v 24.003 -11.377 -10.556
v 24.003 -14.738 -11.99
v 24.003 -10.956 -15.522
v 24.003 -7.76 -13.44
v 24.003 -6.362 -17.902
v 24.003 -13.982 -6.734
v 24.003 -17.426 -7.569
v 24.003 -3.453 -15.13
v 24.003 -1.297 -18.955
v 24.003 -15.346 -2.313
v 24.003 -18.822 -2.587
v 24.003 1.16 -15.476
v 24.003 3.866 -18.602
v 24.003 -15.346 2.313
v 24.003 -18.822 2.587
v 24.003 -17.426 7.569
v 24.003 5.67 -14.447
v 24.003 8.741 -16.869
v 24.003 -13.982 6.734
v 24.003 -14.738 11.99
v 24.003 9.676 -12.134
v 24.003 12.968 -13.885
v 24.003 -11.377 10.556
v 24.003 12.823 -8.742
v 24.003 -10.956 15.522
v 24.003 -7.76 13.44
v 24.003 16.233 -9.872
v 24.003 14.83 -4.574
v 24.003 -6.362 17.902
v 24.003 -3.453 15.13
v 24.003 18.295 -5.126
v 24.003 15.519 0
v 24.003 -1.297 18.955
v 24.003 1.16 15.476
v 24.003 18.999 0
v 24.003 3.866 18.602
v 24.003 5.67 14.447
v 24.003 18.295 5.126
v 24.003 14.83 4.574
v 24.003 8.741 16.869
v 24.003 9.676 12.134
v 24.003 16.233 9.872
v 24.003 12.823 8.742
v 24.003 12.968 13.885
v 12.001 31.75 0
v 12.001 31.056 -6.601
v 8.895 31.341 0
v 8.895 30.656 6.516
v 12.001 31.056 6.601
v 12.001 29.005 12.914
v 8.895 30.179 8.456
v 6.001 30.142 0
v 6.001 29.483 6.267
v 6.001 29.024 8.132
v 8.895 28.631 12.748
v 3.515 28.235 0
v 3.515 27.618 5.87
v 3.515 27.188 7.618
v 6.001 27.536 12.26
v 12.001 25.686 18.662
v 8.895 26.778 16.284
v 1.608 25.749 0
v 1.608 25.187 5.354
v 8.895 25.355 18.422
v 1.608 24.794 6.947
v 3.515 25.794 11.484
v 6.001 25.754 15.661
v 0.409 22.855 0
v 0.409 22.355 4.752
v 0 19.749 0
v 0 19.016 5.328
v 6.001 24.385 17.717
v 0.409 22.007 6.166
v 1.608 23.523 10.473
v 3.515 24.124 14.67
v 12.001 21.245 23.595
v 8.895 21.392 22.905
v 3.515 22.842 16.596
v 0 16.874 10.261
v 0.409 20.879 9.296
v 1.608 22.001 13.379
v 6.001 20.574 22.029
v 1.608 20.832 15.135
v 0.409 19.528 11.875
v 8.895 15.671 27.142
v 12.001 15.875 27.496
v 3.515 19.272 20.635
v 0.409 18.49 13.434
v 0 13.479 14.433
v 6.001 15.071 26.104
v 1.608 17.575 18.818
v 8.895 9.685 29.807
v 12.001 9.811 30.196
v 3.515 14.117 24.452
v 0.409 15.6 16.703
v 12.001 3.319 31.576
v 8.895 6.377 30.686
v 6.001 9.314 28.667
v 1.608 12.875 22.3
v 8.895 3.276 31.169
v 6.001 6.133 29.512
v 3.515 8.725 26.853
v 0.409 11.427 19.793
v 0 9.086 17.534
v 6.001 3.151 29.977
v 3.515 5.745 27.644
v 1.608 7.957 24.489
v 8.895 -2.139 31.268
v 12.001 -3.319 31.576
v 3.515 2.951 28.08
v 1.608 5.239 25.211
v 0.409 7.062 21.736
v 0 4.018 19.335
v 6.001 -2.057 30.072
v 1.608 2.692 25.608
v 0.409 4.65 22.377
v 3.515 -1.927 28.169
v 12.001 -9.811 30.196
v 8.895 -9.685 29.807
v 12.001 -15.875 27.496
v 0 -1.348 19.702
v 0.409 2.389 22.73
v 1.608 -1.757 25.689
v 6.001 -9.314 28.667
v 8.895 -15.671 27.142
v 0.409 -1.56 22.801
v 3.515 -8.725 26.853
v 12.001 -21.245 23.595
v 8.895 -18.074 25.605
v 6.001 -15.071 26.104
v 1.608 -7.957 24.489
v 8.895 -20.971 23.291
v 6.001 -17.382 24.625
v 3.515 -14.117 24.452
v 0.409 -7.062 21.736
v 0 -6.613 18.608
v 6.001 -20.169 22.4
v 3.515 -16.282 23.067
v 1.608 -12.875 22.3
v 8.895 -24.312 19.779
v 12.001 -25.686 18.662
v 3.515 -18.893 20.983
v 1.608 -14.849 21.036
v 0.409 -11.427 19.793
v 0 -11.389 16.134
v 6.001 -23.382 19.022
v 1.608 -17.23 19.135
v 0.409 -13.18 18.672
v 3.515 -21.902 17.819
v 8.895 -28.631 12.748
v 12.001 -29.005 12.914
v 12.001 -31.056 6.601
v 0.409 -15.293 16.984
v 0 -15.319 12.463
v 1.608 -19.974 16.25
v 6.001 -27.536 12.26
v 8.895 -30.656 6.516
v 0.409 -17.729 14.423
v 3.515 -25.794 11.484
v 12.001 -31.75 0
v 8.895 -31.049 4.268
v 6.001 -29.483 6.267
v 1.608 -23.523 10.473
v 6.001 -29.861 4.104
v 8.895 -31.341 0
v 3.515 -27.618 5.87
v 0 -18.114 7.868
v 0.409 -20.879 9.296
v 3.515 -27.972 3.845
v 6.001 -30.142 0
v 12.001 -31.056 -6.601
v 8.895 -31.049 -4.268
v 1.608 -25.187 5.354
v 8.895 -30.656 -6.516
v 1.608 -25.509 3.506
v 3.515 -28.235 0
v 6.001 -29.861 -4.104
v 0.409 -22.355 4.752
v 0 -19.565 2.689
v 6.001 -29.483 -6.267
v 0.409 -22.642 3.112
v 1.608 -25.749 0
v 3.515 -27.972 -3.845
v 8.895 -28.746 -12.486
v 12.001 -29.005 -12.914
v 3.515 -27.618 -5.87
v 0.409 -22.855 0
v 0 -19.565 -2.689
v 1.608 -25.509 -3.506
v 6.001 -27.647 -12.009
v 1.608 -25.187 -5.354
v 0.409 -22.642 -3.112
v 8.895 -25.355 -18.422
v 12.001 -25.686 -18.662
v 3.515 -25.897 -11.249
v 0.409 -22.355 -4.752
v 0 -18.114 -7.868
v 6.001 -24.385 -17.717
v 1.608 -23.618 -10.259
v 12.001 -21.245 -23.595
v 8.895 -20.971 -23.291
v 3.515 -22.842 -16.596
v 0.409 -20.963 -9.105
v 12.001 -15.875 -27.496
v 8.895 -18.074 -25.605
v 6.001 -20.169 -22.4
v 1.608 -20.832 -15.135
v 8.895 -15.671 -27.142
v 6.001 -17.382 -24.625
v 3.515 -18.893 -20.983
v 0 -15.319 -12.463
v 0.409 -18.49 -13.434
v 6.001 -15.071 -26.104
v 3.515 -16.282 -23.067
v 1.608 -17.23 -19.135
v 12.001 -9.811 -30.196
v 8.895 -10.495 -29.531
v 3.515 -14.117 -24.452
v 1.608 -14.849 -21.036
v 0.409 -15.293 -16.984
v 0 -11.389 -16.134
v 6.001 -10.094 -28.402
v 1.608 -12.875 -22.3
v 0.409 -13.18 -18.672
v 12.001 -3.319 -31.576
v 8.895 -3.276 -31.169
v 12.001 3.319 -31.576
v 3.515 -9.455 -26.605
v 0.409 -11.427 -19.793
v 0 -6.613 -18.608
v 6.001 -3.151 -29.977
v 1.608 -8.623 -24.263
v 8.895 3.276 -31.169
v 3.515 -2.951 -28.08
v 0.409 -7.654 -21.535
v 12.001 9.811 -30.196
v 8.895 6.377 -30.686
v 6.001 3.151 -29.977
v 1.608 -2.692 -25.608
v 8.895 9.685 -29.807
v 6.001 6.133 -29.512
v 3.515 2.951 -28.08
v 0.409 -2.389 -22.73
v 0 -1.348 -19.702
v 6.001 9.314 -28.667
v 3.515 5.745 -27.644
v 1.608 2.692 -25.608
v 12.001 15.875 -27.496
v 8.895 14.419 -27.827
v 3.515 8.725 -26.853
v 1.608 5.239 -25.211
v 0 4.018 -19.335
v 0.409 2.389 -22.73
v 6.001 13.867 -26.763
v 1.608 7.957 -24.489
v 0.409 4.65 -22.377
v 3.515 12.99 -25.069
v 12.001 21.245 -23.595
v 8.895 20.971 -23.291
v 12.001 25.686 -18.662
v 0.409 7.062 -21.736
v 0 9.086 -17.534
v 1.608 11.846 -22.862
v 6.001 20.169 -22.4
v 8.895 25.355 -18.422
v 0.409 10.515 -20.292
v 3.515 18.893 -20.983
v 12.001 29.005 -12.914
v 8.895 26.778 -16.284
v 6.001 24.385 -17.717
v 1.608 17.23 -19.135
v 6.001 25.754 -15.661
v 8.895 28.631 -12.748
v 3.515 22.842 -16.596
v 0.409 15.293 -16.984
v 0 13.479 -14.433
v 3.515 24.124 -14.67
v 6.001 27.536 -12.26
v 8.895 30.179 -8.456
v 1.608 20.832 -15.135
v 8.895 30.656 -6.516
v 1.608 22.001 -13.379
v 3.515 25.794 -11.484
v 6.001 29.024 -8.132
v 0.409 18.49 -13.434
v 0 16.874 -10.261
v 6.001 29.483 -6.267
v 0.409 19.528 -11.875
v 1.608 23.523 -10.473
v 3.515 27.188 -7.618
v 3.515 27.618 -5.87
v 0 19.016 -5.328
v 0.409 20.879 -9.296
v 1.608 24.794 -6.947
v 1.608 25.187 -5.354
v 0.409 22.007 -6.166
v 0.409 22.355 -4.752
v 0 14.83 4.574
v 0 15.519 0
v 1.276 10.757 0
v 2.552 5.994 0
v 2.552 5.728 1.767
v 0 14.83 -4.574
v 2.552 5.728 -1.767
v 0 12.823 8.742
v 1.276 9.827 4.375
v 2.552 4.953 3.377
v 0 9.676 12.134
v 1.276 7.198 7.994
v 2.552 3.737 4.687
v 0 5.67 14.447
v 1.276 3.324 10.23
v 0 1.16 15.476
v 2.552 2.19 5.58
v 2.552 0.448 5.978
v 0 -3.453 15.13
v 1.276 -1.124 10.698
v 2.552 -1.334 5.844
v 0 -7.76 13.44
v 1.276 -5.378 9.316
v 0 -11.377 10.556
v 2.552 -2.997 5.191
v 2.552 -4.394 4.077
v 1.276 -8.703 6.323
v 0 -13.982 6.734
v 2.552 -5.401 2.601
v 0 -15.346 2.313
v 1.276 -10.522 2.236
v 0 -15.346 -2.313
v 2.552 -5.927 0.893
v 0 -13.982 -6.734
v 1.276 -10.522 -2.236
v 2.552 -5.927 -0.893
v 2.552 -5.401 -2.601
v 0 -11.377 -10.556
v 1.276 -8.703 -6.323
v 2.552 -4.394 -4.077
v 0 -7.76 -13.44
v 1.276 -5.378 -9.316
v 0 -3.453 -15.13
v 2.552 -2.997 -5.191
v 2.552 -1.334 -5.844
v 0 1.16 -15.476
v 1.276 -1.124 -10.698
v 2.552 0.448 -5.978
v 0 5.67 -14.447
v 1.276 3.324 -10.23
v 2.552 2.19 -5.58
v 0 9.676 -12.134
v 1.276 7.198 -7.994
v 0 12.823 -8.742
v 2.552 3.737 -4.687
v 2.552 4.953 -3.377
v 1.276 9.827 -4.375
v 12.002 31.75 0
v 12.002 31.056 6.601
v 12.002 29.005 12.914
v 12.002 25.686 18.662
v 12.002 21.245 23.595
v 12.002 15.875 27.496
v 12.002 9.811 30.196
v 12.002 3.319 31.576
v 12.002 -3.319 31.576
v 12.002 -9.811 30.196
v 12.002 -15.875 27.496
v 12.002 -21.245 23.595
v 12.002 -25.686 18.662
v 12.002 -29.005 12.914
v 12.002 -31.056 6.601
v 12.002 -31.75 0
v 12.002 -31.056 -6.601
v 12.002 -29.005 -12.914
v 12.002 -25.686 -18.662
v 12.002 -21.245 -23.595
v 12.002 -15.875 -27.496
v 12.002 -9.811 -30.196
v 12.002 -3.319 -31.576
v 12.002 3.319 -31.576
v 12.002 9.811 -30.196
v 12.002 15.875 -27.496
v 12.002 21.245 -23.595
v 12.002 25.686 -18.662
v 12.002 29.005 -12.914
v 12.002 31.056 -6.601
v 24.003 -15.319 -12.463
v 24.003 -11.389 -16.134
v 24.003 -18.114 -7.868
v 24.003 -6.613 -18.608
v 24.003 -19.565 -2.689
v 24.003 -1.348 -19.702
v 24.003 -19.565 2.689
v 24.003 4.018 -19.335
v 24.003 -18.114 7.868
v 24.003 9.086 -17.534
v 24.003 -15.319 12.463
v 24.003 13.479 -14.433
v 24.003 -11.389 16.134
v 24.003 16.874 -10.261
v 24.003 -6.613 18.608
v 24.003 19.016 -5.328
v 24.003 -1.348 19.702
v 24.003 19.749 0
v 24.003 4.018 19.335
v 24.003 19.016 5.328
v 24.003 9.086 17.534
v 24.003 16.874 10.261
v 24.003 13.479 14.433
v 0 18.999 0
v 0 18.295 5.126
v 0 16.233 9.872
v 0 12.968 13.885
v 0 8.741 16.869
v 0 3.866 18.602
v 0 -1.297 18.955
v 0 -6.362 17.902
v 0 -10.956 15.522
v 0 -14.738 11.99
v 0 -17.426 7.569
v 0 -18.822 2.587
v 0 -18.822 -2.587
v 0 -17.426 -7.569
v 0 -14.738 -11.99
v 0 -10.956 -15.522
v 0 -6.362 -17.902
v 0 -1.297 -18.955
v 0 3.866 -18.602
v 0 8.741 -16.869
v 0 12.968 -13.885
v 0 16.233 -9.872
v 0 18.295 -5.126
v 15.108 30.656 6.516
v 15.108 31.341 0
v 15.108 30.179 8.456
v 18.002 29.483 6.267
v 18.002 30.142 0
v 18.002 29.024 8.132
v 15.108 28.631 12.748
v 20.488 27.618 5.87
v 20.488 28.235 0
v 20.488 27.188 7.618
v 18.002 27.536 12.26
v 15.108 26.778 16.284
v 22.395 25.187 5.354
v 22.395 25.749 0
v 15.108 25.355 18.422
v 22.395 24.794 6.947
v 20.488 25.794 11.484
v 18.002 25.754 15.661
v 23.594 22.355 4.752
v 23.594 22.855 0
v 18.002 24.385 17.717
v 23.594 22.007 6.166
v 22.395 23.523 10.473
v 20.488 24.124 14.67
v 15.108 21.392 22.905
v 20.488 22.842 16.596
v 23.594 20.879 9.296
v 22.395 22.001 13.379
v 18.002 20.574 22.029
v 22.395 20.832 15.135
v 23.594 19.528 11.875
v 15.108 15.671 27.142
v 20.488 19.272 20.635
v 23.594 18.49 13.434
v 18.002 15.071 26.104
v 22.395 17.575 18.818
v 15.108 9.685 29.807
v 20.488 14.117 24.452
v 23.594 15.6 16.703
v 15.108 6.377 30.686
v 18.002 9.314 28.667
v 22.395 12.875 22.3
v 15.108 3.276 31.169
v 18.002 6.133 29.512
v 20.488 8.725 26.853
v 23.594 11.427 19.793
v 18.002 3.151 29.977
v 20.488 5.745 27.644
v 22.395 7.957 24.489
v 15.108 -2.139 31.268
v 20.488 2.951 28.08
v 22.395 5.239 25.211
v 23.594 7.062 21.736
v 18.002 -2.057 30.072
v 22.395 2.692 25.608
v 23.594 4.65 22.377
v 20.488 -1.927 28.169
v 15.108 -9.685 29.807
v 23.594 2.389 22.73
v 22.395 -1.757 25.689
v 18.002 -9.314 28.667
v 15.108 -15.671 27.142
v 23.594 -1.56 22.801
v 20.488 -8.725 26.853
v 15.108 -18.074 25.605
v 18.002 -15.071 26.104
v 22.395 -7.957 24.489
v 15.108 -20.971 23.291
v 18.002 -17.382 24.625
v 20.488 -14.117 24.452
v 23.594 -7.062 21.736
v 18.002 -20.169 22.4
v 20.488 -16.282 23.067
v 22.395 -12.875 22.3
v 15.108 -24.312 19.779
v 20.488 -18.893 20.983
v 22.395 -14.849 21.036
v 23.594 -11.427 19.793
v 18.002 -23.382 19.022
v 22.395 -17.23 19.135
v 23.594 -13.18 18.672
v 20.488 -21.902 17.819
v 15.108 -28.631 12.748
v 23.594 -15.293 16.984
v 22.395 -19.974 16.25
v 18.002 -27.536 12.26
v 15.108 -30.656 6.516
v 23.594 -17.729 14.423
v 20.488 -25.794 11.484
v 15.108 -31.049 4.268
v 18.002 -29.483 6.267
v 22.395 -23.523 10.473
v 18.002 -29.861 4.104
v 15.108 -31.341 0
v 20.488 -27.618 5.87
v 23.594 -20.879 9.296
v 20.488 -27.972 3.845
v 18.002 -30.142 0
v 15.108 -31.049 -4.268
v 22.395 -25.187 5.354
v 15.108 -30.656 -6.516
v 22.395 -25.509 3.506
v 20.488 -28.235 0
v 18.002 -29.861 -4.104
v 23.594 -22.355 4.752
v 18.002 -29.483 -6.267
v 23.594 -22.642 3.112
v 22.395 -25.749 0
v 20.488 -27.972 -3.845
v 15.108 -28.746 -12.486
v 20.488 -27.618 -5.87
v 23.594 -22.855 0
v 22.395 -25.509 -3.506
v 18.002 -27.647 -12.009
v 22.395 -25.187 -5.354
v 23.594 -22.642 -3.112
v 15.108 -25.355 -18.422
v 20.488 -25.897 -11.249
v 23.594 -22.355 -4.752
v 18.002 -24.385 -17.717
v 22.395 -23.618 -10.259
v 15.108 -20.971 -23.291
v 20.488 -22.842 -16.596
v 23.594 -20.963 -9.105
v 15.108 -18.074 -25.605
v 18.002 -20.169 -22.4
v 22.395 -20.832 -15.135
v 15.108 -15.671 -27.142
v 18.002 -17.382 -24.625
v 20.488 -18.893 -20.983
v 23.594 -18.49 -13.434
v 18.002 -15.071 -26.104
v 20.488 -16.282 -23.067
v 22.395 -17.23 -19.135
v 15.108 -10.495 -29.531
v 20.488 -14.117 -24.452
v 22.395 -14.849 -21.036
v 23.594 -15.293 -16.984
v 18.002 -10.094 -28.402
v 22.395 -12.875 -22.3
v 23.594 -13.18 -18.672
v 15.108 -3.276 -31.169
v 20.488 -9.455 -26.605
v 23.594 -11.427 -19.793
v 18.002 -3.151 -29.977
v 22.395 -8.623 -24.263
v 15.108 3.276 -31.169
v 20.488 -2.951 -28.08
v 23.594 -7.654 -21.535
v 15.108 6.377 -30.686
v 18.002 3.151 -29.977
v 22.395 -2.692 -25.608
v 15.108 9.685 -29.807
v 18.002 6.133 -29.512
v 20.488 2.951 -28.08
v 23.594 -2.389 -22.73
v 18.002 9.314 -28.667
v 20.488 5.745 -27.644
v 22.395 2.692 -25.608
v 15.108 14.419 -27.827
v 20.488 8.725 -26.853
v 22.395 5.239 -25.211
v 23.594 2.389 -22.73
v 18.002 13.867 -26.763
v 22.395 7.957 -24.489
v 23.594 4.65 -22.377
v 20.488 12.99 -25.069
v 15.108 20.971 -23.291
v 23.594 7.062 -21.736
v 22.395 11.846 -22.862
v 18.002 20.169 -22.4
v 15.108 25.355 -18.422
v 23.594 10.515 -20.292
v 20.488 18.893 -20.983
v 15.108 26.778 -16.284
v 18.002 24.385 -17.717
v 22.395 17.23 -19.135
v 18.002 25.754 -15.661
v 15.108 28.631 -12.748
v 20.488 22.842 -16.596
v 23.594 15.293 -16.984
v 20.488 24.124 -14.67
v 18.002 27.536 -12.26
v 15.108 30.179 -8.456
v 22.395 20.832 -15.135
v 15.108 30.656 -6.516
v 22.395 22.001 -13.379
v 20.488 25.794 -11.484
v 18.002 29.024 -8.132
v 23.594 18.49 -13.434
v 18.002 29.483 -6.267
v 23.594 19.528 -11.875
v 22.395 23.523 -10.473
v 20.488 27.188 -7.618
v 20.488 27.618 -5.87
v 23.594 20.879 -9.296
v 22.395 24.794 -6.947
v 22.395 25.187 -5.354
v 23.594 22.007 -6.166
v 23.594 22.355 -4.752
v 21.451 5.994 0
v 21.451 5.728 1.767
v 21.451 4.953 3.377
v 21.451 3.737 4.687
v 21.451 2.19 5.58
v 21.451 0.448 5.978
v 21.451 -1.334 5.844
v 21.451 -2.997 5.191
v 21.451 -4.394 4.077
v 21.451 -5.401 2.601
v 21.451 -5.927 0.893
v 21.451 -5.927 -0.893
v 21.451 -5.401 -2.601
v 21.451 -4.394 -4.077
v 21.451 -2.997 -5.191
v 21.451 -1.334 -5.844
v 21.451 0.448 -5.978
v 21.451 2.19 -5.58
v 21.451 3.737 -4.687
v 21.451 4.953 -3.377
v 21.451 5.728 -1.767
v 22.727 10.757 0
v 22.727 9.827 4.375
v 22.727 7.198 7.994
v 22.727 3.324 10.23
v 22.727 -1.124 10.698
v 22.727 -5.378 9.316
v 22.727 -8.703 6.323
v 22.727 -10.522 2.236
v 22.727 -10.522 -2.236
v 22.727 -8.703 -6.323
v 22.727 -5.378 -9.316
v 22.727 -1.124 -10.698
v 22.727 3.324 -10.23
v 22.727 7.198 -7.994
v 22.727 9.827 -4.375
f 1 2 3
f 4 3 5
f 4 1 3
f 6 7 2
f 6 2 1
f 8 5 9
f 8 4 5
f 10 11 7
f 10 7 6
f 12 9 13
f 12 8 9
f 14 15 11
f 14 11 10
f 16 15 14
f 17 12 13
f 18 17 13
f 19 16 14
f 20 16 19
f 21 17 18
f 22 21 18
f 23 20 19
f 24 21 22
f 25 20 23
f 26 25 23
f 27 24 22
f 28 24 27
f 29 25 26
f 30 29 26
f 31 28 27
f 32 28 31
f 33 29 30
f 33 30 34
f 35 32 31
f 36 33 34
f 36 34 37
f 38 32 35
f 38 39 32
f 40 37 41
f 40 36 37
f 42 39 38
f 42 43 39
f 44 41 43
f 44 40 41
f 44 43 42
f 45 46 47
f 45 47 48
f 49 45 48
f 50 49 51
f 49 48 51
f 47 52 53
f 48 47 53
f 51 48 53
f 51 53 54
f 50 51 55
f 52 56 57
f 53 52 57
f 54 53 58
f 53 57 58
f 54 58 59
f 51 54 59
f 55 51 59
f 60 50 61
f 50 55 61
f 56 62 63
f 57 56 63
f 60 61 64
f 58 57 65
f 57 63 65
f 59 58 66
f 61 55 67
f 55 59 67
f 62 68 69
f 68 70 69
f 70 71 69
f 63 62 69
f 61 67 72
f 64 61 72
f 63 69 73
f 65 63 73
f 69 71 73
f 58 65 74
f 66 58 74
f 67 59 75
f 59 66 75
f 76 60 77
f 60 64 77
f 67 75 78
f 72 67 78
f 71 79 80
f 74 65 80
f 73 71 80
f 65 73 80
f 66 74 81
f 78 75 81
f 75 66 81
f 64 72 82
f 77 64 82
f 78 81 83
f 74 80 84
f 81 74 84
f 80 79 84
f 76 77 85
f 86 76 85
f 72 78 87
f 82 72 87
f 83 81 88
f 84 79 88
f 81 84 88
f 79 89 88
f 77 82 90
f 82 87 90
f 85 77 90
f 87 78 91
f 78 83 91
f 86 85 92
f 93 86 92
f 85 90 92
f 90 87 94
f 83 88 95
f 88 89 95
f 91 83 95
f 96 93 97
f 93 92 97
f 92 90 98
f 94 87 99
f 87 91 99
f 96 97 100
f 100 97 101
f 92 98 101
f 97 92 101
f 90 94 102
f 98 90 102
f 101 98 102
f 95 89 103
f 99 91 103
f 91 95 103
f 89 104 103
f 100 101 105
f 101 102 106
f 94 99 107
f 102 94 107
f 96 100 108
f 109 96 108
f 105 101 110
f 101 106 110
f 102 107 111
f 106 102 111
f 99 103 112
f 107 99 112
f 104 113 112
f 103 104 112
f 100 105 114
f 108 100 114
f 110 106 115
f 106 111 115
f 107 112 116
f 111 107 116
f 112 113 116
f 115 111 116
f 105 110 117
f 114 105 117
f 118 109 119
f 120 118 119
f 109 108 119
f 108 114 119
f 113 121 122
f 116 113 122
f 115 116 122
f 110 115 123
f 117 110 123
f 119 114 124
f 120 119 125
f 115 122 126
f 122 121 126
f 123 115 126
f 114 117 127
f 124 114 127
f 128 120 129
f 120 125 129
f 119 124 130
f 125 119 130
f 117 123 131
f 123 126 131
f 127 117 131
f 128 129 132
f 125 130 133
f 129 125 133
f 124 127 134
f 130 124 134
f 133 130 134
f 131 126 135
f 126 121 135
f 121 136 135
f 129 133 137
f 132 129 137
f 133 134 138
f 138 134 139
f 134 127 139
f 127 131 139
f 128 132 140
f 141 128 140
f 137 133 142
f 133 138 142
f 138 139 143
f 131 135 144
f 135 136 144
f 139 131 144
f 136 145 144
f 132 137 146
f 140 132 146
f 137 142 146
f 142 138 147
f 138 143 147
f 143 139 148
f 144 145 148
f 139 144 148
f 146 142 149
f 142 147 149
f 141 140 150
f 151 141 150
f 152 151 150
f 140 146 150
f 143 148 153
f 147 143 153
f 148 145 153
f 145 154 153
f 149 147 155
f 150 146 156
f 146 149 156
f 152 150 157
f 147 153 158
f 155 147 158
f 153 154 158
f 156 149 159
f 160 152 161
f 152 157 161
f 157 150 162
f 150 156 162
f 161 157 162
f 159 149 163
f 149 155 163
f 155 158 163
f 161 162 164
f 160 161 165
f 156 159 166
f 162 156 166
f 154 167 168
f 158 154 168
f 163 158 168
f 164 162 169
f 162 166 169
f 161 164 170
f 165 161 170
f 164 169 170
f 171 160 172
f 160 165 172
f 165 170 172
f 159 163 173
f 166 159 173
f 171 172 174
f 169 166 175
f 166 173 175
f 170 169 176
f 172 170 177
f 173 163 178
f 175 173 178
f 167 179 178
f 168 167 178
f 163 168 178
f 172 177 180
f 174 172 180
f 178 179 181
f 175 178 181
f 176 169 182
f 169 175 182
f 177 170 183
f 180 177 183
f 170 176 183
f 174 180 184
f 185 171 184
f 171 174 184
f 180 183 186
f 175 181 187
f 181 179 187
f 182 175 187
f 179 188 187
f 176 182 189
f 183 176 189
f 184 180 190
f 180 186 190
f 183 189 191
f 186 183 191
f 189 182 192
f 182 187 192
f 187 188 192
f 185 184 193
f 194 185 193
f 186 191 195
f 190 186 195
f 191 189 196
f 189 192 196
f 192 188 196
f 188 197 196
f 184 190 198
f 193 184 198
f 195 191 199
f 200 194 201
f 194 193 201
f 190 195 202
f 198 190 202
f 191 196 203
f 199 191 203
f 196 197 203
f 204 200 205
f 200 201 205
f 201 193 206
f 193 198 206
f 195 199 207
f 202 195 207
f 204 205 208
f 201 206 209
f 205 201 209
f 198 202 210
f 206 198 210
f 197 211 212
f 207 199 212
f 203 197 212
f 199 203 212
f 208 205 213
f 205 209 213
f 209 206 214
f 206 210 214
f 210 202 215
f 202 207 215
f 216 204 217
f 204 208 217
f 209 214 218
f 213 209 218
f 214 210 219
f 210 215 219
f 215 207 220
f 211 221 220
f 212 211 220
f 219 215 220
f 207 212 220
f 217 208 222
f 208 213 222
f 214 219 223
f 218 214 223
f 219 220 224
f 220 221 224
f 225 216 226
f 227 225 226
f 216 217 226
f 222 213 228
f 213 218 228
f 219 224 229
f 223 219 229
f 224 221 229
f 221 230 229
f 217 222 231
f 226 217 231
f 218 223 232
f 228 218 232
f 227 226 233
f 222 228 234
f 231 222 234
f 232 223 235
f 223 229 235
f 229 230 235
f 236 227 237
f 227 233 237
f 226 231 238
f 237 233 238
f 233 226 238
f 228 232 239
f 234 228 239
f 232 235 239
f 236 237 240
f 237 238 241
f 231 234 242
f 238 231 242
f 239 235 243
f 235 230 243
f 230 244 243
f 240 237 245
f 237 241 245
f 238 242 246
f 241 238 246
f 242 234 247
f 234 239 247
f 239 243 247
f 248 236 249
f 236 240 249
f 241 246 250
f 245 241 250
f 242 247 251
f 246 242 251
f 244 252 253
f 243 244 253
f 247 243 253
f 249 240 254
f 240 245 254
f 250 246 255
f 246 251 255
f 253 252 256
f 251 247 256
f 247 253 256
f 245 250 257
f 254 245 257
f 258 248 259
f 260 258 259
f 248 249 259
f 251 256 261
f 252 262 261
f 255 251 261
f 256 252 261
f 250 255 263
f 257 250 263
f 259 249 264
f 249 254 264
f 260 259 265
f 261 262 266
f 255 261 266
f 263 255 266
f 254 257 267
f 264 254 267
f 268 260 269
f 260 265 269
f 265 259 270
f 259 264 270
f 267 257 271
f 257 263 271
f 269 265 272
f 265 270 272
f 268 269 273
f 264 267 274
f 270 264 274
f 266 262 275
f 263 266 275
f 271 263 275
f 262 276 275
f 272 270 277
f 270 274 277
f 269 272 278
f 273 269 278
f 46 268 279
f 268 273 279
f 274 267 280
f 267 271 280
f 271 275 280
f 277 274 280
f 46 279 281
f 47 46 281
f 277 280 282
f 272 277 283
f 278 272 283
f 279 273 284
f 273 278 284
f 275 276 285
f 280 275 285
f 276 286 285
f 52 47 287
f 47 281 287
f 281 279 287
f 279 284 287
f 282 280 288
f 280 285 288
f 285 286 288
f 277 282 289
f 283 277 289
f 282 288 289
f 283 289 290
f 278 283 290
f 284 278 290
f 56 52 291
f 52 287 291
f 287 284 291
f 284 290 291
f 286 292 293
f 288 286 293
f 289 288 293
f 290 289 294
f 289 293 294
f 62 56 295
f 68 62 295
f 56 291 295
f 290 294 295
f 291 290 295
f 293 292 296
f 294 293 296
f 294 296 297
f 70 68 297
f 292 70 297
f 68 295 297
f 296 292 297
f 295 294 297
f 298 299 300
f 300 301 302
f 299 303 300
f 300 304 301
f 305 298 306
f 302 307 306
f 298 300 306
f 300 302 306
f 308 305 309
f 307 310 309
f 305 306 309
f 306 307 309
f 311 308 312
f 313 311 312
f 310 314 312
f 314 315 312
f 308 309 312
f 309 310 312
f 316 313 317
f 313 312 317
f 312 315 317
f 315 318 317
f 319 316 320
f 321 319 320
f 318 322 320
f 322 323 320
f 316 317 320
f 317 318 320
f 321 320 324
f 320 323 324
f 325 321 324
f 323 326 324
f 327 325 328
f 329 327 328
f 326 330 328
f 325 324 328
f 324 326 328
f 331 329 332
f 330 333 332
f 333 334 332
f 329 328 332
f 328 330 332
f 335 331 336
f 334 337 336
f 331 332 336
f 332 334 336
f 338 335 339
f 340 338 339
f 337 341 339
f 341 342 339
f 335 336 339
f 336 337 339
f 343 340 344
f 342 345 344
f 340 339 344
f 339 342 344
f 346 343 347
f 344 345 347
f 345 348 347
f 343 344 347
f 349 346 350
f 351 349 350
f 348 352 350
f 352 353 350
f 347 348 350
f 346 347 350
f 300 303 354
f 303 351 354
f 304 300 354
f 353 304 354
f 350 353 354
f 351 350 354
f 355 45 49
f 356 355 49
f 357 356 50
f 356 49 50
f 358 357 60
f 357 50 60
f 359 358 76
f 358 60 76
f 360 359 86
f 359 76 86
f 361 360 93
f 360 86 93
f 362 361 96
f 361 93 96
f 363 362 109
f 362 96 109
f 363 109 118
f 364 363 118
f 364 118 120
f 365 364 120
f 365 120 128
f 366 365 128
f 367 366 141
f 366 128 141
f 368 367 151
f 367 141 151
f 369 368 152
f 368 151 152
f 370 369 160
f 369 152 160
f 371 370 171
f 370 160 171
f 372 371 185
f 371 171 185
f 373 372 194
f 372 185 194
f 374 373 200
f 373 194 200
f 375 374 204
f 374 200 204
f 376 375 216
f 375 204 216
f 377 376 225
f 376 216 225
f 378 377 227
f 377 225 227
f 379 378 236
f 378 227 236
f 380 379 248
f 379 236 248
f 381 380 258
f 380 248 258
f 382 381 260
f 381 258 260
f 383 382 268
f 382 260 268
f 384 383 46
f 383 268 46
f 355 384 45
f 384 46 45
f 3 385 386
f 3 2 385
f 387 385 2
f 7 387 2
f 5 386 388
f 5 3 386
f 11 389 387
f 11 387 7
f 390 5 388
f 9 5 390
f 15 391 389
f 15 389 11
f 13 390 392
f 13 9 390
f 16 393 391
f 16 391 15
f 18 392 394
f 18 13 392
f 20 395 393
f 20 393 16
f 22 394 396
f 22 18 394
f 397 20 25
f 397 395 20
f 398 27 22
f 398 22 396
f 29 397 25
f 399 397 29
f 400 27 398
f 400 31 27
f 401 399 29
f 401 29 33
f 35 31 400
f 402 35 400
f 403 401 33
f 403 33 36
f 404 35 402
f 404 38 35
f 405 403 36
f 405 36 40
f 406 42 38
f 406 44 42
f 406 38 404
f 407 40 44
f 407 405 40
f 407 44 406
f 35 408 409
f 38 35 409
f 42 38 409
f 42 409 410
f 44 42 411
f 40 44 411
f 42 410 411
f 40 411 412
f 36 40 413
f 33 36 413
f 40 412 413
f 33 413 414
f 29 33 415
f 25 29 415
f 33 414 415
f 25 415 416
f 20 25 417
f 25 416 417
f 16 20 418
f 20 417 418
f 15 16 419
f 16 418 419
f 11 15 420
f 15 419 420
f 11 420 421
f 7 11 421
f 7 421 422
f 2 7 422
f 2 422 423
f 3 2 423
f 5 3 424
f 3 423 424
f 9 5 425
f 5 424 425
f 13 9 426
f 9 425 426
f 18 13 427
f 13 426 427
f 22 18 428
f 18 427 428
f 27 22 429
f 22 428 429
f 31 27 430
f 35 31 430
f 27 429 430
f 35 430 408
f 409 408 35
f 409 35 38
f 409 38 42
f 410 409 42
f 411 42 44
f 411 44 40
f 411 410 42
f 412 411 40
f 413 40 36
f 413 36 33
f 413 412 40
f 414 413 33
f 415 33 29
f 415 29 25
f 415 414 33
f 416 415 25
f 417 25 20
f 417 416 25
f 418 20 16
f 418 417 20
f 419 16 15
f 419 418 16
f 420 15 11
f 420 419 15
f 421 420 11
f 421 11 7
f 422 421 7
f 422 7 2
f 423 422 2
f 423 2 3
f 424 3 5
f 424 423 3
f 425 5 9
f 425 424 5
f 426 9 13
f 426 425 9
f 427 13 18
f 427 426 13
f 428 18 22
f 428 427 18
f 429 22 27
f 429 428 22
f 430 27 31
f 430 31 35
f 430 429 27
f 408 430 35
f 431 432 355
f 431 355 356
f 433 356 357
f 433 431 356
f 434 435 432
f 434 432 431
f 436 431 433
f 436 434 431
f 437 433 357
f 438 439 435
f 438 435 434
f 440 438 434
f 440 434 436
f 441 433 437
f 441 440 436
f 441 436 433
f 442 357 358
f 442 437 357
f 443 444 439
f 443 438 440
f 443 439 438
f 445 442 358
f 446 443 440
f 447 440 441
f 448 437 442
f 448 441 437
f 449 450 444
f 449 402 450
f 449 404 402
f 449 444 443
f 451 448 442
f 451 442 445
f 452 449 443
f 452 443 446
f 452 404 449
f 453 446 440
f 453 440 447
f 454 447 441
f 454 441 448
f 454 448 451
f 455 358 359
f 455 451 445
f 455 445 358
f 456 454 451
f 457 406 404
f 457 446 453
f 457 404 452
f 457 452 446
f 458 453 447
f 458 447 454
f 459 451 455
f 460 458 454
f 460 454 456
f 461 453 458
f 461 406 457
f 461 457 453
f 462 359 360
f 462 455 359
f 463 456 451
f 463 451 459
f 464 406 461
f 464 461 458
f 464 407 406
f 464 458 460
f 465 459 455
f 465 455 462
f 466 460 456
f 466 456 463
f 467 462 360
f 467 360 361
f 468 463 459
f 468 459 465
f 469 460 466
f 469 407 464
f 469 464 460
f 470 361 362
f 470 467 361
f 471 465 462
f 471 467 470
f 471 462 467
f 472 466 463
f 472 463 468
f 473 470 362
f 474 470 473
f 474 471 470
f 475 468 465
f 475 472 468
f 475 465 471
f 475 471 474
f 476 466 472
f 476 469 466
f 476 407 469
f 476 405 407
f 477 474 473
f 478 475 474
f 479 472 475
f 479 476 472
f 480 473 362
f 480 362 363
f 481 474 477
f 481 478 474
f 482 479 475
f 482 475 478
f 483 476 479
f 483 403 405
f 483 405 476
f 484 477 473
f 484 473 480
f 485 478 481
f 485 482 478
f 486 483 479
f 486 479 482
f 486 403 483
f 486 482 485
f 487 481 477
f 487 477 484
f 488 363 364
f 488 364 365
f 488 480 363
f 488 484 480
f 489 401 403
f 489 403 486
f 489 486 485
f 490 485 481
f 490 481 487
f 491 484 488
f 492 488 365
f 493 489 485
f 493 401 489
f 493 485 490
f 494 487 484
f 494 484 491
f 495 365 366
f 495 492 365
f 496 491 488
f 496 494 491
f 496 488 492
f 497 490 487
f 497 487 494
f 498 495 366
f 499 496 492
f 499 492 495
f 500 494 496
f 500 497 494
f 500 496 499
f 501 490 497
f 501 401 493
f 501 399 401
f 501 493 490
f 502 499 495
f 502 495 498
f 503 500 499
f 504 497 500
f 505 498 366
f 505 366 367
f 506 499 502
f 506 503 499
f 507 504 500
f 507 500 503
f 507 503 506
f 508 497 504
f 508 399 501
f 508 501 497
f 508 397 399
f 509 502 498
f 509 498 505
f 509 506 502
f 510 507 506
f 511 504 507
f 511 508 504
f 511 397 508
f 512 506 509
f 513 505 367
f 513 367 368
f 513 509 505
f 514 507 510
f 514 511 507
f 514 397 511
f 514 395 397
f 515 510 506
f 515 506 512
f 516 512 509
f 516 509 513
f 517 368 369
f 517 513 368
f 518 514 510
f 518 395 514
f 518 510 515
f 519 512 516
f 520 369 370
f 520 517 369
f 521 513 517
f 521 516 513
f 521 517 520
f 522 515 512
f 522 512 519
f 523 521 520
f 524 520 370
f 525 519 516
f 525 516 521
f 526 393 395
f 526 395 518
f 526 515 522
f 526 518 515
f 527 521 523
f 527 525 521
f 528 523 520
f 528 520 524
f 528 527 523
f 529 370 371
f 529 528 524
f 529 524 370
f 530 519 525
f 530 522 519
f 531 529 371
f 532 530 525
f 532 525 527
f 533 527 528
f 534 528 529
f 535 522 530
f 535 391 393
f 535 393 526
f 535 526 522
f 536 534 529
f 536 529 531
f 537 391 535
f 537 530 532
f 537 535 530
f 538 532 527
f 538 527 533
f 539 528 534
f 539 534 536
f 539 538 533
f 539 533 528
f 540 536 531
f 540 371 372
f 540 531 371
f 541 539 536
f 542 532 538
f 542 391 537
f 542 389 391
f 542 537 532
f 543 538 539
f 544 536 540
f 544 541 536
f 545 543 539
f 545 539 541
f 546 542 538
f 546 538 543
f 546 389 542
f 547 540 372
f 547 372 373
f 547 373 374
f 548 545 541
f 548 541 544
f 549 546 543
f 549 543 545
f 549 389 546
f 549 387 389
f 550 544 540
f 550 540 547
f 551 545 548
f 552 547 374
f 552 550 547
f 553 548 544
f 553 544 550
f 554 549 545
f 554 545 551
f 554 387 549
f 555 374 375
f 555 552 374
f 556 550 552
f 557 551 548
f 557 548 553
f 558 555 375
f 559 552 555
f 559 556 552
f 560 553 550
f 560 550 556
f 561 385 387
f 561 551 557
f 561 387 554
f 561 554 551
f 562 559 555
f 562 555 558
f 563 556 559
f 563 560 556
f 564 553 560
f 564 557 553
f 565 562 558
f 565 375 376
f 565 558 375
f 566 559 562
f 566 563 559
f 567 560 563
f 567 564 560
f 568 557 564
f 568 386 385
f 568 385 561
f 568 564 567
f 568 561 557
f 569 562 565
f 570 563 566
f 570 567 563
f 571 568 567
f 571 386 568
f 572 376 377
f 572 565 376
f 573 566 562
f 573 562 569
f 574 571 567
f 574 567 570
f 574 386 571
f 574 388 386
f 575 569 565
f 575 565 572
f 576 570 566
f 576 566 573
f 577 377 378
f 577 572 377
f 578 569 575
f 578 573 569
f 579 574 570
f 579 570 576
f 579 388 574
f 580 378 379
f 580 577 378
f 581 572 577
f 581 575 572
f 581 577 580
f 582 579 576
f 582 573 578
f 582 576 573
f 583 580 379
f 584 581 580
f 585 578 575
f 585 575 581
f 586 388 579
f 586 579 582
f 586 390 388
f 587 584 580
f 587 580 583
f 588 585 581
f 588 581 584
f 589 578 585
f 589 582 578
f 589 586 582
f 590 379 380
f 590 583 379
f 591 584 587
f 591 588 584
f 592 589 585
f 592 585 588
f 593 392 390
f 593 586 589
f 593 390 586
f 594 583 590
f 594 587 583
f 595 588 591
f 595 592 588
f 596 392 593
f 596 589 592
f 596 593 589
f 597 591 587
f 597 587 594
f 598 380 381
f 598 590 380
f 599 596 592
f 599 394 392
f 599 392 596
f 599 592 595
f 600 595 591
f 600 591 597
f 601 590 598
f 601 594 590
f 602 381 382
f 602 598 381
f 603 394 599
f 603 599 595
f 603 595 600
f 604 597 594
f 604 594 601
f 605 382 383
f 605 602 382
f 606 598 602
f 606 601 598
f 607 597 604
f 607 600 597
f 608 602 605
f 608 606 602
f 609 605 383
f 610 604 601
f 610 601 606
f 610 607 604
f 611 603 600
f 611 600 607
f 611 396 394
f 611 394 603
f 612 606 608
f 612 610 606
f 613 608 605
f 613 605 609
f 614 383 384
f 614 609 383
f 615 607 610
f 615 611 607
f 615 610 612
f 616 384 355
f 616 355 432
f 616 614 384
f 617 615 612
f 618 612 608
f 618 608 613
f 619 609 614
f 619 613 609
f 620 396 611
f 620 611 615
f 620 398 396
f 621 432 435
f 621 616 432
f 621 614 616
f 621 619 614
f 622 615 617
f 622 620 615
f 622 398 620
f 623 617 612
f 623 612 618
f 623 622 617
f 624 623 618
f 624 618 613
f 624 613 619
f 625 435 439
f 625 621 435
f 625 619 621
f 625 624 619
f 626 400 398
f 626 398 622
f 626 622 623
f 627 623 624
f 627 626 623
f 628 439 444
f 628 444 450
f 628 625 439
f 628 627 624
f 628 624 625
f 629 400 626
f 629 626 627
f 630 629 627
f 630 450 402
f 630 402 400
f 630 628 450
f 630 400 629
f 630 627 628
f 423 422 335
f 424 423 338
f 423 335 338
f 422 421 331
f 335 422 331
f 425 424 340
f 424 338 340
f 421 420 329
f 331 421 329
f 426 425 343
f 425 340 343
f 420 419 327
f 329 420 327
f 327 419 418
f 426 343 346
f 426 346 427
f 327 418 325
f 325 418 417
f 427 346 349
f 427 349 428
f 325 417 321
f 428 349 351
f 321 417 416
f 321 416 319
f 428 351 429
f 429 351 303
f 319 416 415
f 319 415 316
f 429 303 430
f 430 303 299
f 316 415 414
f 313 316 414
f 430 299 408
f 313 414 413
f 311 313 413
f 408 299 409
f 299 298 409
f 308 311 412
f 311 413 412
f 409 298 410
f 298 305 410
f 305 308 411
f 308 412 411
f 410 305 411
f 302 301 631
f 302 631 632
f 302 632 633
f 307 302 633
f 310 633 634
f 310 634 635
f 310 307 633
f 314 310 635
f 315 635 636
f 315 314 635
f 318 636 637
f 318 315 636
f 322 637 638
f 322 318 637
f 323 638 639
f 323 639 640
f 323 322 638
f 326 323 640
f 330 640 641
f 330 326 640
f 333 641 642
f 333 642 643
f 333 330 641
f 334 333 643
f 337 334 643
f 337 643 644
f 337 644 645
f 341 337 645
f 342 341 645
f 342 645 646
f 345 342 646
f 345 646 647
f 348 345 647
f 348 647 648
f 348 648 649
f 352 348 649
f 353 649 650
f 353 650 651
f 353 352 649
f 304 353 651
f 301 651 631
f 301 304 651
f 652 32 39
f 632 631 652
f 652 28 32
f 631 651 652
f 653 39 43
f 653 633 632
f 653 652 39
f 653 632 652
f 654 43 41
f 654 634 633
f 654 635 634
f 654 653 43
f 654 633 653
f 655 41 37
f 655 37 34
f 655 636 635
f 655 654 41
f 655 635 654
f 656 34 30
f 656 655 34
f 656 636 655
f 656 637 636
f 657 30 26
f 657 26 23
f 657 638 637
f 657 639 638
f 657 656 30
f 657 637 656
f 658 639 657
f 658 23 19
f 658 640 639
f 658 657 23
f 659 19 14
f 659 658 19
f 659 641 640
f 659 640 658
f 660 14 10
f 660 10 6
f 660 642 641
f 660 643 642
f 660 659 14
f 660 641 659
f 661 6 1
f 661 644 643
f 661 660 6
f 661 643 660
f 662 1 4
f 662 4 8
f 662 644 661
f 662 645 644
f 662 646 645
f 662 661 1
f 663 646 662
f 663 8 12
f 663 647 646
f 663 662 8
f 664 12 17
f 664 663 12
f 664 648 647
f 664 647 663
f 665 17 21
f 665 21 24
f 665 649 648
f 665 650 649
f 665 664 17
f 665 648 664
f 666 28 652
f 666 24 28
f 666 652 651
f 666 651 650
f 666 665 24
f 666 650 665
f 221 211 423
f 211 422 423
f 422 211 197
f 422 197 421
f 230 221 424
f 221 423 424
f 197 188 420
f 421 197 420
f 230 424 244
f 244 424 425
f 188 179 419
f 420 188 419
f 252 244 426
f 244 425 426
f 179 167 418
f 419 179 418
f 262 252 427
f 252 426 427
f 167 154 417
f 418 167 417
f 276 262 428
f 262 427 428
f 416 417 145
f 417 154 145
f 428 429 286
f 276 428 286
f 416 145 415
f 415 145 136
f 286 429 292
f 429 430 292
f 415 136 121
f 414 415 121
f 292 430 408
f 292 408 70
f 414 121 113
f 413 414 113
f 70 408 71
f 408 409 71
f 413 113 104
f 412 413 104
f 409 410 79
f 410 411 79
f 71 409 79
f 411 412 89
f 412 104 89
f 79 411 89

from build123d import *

# Parameters (mm, degrees)
F0_R     = 31.75
F0_R_2   = 18.9992
F1_DEPTH = 24.003
F2_R     = 12.00149
F0_R_3   = 16.002
F3_DEPTH = 24.003
F0_R_4   = 5.9944
F4_DEPTH = 24.003
F5_SIZE2 = 2.5522160579
F5_SIZE  = 9.525
F6_SIZE2 = 2.5522160579
F6_SIZE  = 9.525


# Not quite as in the source:
# - a fillet or chamfer is up to 0.001 mm smaller than in the source, because OpenCascade refuses the exact size


with BuildPart() as f1:
    # F0 (on Right) → F1 (new body)
    with BuildSketch(Plane.YZ):
        Circle(F0_R)
        Circle(F0_R_2, mode=Mode.SUBTRACT)
    extrude(amount=F1_DEPTH)

    # F2 (radius 12.0015 in the source; OpenCascade refuses exactly that, so slightly less here)
    f2_edges = [f1.edges().sort_by_distance(p)[0] for p in [
        (24.003, -31.75, 0),
        (0, -31.75, 0),
    ]]
    fillet(f2_edges, radius=F2_R)


with BuildPart() as f3:
    # F0 (on Right) → F3 (new body)
    with BuildSketch(Plane.YZ):
        Circle(F0_R_2)
        Circle(F0_R_3, mode=Mode.SUBTRACT)
    extrude(amount=F3_DEPTH)

    # F0 (on Right) → F4 (join)
    with BuildSketch(Plane.YZ):
        Circle(F0_R_3)
        Circle(F0_R_4, mode=Mode.SUBTRACT)
    extrude(amount=F4_DEPTH)

    # F5
    f5_edges = [f3.edges().sort_by_distance(p)[0] for p in [
        (24.003, -5.9944, 0),
    ]]
    f5_side = f3.faces().sort_by_distance((24.003, -18.461821, 0))[0]
    chamfer(f5_edges, length=F5_SIZE, length2=F5_SIZE2, reference=f5_side)

    # F6
    f6_edges = [f3.edges().sort_by_distance(p)[0] for p in [
        (0, -5.9944, 0),
    ]]
    f6_side = f3.faces().sort_by_distance((0, -18.461821, 0))[0]
    chamfer(f6_edges, length=F6_SIZE, length2=F6_SIZE2, reference=f6_side)


solid = Compound([f1.part, f3.part])
